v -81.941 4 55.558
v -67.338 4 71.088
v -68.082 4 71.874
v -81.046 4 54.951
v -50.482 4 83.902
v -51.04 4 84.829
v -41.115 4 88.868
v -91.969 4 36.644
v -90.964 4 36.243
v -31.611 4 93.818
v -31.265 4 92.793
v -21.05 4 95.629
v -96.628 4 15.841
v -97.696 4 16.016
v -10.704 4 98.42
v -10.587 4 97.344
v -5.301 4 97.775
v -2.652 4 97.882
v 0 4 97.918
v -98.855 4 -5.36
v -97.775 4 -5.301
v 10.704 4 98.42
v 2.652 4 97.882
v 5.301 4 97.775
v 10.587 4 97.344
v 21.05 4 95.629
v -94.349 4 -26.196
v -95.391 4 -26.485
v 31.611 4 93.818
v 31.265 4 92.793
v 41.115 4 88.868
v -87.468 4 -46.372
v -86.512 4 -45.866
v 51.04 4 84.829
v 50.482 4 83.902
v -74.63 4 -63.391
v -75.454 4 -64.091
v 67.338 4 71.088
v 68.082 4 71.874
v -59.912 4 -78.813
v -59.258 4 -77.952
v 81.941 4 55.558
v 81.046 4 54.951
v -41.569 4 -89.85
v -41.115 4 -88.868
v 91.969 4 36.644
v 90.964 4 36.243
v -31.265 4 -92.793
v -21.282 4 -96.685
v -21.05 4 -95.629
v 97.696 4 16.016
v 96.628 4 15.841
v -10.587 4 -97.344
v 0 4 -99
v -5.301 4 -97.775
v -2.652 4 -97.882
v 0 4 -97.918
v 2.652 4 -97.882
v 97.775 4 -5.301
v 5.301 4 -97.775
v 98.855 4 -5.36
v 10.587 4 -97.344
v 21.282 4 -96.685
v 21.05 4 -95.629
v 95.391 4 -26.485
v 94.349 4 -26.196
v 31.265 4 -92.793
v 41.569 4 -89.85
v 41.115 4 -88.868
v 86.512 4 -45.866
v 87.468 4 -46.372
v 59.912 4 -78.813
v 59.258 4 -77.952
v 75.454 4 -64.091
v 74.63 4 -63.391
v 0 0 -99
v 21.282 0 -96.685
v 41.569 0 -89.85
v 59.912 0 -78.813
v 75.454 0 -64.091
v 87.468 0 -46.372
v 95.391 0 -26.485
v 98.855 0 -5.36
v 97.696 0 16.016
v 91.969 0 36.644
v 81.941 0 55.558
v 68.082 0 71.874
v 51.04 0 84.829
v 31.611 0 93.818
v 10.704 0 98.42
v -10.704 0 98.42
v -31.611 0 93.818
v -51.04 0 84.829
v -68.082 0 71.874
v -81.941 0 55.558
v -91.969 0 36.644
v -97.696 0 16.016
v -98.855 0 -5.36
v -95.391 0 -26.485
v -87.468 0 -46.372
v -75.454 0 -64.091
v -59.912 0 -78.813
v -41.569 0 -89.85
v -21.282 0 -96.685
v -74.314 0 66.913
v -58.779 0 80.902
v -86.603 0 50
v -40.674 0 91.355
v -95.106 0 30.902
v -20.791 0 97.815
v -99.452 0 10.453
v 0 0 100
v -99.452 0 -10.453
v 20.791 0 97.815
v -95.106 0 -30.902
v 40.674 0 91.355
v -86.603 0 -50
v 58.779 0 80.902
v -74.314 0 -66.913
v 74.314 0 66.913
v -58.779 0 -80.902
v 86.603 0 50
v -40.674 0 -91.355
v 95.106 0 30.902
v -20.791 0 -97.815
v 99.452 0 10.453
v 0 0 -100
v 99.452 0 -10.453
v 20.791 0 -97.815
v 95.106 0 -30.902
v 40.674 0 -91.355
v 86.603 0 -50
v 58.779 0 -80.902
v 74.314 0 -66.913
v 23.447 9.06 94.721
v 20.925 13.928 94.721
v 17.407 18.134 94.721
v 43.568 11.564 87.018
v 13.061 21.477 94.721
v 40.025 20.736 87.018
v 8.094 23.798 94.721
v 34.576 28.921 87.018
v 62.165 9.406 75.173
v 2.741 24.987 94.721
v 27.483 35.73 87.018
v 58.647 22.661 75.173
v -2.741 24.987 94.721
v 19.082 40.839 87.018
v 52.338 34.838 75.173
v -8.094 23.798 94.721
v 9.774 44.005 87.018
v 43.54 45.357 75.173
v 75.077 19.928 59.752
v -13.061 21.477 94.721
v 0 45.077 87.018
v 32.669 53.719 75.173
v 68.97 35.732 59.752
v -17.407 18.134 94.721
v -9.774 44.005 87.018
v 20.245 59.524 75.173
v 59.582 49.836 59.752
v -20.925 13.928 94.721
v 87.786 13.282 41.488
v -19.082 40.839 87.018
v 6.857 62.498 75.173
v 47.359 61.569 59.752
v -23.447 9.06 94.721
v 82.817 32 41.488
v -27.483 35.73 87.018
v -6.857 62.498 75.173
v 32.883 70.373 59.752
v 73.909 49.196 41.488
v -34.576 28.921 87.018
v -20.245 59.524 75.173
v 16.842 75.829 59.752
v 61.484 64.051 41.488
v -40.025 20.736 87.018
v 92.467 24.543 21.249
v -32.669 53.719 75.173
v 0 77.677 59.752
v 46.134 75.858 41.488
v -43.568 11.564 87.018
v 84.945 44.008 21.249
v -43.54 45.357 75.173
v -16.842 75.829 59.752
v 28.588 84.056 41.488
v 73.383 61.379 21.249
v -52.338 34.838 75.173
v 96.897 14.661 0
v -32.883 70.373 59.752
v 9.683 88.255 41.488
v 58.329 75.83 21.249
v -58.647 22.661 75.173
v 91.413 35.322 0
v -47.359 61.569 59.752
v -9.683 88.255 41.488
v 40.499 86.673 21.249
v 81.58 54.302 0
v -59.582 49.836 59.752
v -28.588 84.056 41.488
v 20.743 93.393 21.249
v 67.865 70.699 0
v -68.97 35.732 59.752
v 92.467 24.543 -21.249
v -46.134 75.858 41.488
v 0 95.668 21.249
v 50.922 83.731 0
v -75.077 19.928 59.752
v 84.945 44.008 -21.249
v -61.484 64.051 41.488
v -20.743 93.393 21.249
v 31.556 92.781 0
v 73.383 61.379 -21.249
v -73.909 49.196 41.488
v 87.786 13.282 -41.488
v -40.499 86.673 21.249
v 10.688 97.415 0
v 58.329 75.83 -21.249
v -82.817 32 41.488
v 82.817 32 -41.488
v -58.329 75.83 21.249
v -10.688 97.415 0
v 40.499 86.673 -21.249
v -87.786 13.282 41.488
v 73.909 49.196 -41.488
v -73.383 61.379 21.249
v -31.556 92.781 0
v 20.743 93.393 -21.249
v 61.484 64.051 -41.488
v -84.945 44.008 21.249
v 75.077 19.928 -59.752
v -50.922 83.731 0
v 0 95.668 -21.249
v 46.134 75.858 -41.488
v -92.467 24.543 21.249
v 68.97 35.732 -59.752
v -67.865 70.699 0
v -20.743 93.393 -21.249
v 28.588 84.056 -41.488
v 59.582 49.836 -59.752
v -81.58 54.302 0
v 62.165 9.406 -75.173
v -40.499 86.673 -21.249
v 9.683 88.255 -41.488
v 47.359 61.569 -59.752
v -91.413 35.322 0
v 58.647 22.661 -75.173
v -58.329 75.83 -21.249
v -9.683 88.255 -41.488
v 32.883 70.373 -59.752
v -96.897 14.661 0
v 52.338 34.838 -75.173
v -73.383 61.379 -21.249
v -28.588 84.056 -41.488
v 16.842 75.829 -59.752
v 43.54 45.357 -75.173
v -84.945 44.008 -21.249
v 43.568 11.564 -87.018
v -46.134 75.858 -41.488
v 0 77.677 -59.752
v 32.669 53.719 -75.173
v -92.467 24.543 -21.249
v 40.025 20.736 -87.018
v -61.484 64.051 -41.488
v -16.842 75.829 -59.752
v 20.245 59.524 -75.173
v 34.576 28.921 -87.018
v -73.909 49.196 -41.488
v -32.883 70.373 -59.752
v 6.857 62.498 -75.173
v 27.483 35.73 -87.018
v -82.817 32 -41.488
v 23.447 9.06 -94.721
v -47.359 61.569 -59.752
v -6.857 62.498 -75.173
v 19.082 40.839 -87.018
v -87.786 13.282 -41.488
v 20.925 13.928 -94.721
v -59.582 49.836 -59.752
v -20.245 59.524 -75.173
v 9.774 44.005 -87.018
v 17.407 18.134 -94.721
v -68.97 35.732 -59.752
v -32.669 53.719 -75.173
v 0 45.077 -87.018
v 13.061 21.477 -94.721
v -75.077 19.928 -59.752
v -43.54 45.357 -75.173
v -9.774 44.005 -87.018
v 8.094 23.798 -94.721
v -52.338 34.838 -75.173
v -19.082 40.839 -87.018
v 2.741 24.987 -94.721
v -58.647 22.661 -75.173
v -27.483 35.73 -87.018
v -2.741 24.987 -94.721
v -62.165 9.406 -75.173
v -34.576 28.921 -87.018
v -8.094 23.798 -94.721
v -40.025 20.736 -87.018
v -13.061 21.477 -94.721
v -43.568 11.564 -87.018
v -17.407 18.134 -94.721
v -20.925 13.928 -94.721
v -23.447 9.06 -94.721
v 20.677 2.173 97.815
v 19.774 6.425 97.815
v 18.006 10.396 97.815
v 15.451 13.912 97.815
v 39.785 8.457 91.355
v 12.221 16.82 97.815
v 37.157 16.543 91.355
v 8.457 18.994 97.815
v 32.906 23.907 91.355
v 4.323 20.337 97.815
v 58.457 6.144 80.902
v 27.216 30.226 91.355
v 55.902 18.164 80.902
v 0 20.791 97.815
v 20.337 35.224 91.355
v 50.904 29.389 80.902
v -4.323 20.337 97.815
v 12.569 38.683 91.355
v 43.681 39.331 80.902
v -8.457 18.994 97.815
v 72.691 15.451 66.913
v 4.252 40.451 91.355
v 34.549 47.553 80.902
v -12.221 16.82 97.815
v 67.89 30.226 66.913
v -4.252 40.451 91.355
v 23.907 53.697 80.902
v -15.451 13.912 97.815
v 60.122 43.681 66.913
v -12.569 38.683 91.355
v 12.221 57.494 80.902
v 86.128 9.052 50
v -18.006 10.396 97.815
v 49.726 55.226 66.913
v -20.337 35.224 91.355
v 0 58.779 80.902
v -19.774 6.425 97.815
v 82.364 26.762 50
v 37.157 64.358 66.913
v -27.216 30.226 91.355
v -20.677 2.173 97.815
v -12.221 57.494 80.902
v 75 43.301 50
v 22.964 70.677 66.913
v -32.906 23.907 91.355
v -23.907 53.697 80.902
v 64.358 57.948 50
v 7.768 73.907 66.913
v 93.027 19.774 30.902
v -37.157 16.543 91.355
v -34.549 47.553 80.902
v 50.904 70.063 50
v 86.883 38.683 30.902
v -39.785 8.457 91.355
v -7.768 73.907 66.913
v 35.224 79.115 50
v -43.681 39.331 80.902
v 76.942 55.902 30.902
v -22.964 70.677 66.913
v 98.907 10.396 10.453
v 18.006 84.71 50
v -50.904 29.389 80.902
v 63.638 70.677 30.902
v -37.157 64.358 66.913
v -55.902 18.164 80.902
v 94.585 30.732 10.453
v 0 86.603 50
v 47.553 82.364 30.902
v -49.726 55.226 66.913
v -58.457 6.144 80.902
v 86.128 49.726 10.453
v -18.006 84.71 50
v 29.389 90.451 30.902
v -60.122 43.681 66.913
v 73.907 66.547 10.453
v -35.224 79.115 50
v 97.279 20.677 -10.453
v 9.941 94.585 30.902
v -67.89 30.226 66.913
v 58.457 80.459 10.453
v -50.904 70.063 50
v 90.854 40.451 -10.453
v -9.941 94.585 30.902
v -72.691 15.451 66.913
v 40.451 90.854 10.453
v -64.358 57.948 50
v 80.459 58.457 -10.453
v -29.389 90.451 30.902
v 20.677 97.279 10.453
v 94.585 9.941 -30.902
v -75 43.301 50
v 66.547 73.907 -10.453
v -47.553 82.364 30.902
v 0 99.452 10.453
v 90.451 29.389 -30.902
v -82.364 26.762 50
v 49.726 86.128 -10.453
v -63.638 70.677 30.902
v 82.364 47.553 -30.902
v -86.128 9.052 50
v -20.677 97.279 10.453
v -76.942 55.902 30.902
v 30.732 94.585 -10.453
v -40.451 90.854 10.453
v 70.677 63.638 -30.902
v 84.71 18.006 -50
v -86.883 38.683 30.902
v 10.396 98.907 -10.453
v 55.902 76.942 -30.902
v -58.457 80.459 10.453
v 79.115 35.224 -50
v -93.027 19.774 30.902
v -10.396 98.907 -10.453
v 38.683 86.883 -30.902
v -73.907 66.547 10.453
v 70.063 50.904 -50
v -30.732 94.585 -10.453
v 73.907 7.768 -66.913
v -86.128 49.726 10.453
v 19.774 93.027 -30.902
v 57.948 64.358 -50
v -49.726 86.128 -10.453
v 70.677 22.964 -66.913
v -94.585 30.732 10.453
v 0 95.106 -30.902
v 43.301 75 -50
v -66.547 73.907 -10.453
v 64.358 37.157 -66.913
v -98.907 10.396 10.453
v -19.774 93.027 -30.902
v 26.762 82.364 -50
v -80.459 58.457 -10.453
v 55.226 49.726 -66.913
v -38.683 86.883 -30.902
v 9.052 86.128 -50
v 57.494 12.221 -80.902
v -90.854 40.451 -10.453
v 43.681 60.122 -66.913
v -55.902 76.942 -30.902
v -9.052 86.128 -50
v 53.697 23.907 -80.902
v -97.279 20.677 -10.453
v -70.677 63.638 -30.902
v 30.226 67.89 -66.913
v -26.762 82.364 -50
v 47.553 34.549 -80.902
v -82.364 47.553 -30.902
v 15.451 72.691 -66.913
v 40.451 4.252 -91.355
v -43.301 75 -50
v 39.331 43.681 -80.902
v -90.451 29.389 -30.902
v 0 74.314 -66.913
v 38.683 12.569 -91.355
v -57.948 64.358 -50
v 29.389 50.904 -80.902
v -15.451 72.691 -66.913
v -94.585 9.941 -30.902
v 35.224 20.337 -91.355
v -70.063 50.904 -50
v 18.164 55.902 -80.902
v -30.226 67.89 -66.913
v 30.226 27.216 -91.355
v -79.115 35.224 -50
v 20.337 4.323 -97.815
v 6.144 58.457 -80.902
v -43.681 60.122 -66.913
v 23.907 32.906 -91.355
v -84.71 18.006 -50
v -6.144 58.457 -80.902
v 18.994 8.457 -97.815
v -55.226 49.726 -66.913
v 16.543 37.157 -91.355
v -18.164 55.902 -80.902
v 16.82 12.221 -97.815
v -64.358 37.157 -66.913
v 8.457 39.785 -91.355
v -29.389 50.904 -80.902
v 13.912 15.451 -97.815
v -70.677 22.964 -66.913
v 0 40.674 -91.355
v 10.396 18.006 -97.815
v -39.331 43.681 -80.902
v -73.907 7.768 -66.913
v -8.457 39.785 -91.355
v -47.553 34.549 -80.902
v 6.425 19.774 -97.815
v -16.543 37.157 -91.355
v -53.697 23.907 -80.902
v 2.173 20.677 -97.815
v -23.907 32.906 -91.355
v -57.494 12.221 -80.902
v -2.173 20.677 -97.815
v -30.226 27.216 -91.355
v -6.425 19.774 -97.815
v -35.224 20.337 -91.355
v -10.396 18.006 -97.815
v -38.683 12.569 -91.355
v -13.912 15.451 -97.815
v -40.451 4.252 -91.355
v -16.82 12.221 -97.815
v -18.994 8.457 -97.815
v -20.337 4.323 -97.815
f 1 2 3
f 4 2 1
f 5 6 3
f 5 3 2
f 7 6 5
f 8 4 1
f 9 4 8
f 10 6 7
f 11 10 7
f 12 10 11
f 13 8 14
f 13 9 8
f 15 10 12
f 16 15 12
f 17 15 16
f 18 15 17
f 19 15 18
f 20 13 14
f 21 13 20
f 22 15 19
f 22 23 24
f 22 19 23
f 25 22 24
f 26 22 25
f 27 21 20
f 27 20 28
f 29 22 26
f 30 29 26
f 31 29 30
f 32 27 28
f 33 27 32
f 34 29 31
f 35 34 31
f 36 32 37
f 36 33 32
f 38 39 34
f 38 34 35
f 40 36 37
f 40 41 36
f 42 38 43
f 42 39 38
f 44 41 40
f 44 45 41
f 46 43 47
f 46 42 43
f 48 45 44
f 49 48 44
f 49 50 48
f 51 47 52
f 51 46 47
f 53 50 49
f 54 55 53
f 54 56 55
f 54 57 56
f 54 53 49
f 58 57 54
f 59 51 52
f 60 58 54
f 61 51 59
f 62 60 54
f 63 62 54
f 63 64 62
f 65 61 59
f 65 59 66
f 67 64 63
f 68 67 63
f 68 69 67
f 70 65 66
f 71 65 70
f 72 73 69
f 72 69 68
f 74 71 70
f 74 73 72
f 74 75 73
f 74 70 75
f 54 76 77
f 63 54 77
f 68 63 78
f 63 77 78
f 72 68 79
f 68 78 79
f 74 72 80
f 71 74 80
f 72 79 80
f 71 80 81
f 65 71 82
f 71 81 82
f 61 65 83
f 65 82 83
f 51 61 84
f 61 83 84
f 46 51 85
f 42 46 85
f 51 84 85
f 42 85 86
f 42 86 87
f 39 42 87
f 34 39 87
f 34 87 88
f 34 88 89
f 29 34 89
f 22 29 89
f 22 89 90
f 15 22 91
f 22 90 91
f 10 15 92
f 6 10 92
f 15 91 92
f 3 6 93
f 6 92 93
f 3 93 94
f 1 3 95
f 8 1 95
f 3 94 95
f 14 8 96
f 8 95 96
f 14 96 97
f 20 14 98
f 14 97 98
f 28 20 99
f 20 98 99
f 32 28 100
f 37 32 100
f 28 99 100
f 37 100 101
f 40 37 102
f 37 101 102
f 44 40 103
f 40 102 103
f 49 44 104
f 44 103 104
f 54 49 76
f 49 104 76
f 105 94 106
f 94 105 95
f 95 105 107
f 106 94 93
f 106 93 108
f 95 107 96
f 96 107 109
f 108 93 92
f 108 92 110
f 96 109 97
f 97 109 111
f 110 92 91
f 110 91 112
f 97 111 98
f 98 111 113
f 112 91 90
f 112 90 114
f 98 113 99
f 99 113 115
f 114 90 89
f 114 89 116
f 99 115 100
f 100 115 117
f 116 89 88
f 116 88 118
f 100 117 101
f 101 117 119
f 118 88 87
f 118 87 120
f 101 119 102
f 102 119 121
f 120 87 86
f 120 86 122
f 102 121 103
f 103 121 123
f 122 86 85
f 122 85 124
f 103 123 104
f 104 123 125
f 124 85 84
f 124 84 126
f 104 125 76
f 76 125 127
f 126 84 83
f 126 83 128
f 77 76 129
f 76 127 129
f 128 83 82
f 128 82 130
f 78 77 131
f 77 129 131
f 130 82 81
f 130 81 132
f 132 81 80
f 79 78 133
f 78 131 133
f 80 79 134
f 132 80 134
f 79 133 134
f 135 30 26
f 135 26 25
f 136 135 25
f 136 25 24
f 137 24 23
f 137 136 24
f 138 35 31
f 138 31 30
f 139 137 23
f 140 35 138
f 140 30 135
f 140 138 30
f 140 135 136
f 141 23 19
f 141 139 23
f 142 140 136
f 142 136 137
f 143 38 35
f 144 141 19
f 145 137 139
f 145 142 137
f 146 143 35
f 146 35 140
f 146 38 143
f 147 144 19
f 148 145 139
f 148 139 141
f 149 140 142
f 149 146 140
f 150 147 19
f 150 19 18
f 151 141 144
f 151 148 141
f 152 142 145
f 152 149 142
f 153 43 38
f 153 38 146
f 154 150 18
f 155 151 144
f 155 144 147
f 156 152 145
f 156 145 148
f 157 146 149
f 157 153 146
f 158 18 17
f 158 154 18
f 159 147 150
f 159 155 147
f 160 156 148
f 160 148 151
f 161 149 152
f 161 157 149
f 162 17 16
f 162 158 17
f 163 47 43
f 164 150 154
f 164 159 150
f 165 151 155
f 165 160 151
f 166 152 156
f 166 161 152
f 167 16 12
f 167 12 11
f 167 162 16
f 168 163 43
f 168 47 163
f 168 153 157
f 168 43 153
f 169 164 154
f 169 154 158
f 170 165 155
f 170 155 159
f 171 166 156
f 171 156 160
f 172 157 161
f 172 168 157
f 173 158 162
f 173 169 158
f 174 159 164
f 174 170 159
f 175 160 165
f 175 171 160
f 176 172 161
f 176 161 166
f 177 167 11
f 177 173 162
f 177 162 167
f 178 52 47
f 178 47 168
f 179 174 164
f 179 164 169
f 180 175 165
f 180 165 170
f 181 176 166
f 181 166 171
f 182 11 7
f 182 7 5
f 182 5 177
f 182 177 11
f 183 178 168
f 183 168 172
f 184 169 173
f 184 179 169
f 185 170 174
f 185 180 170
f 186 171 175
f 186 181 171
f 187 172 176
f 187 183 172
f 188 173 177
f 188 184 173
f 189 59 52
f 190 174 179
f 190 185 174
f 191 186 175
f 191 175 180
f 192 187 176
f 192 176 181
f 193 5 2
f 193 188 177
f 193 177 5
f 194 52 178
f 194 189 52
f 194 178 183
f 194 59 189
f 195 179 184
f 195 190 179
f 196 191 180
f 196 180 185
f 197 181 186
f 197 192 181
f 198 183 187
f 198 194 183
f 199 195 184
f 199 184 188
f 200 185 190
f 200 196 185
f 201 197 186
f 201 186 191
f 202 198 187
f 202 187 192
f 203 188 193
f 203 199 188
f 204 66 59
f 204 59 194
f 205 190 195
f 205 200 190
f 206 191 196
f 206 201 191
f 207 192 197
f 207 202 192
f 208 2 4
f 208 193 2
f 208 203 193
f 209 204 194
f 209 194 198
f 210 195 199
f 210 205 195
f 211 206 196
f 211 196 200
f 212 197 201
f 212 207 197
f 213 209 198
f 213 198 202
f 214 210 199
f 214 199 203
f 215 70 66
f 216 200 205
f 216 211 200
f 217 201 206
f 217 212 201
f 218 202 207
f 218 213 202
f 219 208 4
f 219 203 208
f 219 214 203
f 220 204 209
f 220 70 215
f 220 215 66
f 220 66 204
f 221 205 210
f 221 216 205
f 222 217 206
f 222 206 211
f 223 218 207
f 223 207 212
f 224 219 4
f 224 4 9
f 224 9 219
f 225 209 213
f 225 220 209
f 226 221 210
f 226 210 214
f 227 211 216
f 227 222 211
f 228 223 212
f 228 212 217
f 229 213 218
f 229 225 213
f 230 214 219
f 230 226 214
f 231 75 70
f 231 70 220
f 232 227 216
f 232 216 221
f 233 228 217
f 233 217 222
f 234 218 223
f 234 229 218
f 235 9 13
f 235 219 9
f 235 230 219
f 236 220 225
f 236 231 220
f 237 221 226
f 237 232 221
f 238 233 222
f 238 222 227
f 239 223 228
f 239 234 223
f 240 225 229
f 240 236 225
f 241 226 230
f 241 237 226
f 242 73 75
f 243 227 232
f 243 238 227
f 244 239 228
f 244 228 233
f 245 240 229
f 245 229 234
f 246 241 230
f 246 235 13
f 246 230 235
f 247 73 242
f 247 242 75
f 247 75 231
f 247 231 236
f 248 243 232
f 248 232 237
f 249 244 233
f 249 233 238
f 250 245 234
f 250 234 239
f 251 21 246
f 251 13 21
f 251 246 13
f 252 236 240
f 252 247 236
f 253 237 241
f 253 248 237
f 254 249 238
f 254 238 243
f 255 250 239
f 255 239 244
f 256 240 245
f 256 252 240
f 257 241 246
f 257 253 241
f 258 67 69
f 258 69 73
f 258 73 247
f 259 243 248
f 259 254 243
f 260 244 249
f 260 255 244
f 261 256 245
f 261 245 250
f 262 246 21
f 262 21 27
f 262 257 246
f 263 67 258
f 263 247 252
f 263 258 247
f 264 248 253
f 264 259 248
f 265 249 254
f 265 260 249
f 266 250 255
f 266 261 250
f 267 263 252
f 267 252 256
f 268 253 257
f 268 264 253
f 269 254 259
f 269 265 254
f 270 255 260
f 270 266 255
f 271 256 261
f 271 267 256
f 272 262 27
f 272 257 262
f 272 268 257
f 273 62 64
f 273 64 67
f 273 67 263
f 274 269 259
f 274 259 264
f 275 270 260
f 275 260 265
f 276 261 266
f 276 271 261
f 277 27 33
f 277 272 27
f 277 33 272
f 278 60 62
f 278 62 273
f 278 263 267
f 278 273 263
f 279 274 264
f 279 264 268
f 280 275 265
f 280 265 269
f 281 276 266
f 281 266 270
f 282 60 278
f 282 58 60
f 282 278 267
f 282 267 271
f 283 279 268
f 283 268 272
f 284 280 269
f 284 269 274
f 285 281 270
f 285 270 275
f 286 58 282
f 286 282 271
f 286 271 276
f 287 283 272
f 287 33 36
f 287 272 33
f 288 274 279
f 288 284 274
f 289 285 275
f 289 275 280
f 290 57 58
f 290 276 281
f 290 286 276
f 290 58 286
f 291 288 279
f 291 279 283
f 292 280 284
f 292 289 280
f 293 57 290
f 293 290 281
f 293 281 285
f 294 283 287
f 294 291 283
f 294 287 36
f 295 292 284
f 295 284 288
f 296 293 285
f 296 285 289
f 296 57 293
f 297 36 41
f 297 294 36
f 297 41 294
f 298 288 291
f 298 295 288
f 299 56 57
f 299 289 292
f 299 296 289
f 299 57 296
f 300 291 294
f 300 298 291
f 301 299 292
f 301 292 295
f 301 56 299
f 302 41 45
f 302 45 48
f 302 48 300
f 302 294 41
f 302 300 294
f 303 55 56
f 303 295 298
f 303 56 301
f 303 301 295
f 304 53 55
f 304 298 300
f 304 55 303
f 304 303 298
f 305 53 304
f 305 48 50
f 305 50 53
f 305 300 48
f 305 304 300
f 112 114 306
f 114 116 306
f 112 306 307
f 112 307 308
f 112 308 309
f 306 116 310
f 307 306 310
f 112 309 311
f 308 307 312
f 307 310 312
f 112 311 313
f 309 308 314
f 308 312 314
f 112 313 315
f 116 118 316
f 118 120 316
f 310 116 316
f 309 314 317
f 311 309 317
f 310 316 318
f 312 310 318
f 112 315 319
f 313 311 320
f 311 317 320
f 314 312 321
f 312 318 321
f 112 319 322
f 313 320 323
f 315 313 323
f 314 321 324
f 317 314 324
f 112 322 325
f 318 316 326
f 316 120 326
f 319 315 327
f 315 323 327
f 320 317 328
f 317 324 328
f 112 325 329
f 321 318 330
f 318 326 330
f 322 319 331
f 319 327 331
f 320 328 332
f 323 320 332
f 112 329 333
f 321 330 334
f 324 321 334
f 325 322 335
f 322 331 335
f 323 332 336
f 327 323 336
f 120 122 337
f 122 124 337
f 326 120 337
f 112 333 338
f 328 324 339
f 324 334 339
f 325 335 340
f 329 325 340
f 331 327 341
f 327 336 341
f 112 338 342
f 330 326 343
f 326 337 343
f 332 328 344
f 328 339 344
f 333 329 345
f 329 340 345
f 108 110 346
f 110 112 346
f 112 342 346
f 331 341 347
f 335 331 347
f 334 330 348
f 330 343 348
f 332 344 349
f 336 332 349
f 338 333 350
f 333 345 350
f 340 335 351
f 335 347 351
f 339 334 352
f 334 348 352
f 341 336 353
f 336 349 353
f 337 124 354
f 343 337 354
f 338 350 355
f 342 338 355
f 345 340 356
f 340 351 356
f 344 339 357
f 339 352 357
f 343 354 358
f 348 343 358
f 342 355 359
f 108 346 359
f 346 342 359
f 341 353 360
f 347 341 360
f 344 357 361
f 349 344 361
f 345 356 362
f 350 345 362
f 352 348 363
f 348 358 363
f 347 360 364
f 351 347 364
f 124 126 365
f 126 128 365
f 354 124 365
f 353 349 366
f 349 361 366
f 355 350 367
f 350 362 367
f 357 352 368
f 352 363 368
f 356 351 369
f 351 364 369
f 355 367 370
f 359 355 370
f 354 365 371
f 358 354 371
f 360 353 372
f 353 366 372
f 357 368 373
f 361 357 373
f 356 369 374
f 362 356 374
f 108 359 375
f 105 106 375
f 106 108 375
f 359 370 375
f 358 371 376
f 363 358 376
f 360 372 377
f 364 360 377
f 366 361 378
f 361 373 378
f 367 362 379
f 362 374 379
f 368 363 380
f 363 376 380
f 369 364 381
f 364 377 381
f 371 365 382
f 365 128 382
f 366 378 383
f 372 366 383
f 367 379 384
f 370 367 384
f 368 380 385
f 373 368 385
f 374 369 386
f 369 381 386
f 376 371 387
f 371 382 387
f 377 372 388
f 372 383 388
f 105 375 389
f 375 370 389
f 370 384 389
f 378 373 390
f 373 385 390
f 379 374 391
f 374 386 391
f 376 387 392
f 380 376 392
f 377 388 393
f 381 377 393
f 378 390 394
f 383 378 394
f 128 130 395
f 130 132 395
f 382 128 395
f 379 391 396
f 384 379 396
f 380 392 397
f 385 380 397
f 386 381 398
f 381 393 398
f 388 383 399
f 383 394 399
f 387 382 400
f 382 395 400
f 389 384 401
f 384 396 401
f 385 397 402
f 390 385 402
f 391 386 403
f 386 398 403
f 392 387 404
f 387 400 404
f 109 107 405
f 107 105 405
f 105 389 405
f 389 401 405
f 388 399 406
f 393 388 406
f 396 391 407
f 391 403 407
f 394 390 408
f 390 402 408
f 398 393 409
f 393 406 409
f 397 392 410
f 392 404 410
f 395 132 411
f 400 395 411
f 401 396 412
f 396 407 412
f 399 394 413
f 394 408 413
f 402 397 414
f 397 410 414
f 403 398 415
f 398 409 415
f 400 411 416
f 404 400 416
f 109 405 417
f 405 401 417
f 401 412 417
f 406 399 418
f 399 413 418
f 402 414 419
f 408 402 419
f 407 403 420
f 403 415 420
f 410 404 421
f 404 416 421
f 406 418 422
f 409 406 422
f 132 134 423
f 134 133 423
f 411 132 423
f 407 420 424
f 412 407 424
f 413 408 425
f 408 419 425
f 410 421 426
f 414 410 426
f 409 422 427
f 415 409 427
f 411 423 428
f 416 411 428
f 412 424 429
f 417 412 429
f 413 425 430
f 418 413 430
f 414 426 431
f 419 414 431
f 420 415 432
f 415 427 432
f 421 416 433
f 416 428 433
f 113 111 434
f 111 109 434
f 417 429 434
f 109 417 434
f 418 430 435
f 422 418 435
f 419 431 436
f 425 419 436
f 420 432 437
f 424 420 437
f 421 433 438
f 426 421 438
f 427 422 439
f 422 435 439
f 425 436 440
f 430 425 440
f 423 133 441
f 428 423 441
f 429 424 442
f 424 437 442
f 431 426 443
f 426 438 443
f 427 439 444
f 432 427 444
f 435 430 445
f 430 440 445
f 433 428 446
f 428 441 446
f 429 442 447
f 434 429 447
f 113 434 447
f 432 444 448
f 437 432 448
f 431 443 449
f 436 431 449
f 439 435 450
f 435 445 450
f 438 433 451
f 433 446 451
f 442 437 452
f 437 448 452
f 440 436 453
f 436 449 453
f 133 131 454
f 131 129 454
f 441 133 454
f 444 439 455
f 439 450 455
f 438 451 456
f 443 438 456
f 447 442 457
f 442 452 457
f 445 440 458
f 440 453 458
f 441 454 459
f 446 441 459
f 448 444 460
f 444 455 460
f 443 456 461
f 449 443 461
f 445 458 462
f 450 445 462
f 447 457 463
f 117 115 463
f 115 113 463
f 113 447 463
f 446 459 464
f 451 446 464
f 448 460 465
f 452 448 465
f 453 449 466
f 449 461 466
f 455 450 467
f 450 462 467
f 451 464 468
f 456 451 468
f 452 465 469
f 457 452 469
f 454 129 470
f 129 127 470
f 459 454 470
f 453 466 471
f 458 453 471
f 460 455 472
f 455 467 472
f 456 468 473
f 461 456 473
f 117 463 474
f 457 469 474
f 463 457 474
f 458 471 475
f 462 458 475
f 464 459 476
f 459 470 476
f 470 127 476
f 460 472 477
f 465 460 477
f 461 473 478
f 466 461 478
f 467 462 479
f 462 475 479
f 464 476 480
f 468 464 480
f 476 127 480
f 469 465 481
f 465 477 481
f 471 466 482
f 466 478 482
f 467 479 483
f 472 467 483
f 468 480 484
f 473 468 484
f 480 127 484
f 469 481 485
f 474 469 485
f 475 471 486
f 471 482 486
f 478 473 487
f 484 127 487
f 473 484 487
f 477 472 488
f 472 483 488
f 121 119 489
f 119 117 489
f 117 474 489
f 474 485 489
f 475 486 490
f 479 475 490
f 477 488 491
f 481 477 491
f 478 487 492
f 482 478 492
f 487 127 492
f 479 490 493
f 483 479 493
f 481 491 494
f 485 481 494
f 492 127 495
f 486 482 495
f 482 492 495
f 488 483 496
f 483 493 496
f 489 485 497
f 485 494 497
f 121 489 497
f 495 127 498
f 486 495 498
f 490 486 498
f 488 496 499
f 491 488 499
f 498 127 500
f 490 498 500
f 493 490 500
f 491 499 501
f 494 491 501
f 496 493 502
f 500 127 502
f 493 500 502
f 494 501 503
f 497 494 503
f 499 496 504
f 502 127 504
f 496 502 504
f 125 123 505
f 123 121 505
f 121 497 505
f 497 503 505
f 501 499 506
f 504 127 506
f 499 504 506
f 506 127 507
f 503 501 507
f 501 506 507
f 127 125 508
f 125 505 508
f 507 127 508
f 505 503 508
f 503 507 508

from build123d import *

# Parameters (mm, degrees)
SHELL1_T           = 2
SKETCH2_R          = 125.720178412
CUT_EXTRUDE1_DEPTH = 156
SKETCH3_R          = 99
CUT_EXTRUDE2_DEPTH = 4


with BuildPart() as part:
    # Sketch1 → Revolve1 (revolve)
    with BuildSketch(Plane(origin=(0, 0, 0), x_dir=(1, 0, 0), z_dir=(0, 1, 0))):
        with BuildLine():
            Line((0, 100), (0, -100))
            ThreePointArc((0, -100), (100, 0), (0, 100))
        make_face()
    revolve(axis=Axis((0, 0, -100), (0, 0, 1)))

    # Shell1 (no face opened: a closed hollow body)
    add(offset(amount=-SHELL1_T, mode=Mode.PRIVATE), mode=Mode.SUBTRACT)

    # Sketch2 → Cut-Extrude1 (cut)
    with BuildSketch(Plane(origin=(0, 0, 0), x_dir=(1, 0, 0), z_dir=(0, 1, 0))):
        Circle(SKETCH2_R)
    extrude(amount=-CUT_EXTRUDE1_DEPTH, mode=Mode.SUBTRACT)

    # Sketch3 → Cut-Extrude2 (cut)
    with BuildSketch(Plane(origin=(0, 0, 0), x_dir=(-1, 0, 0), z_dir=(0, -1, 0))):
        with Locations(Location((0, 0, 0), (0, 0, 90))):
            Circle(SKETCH3_R)
    extrude(amount=-CUT_EXTRUDE2_DEPTH, mode=Mode.SUBTRACT)


solid = part.part
